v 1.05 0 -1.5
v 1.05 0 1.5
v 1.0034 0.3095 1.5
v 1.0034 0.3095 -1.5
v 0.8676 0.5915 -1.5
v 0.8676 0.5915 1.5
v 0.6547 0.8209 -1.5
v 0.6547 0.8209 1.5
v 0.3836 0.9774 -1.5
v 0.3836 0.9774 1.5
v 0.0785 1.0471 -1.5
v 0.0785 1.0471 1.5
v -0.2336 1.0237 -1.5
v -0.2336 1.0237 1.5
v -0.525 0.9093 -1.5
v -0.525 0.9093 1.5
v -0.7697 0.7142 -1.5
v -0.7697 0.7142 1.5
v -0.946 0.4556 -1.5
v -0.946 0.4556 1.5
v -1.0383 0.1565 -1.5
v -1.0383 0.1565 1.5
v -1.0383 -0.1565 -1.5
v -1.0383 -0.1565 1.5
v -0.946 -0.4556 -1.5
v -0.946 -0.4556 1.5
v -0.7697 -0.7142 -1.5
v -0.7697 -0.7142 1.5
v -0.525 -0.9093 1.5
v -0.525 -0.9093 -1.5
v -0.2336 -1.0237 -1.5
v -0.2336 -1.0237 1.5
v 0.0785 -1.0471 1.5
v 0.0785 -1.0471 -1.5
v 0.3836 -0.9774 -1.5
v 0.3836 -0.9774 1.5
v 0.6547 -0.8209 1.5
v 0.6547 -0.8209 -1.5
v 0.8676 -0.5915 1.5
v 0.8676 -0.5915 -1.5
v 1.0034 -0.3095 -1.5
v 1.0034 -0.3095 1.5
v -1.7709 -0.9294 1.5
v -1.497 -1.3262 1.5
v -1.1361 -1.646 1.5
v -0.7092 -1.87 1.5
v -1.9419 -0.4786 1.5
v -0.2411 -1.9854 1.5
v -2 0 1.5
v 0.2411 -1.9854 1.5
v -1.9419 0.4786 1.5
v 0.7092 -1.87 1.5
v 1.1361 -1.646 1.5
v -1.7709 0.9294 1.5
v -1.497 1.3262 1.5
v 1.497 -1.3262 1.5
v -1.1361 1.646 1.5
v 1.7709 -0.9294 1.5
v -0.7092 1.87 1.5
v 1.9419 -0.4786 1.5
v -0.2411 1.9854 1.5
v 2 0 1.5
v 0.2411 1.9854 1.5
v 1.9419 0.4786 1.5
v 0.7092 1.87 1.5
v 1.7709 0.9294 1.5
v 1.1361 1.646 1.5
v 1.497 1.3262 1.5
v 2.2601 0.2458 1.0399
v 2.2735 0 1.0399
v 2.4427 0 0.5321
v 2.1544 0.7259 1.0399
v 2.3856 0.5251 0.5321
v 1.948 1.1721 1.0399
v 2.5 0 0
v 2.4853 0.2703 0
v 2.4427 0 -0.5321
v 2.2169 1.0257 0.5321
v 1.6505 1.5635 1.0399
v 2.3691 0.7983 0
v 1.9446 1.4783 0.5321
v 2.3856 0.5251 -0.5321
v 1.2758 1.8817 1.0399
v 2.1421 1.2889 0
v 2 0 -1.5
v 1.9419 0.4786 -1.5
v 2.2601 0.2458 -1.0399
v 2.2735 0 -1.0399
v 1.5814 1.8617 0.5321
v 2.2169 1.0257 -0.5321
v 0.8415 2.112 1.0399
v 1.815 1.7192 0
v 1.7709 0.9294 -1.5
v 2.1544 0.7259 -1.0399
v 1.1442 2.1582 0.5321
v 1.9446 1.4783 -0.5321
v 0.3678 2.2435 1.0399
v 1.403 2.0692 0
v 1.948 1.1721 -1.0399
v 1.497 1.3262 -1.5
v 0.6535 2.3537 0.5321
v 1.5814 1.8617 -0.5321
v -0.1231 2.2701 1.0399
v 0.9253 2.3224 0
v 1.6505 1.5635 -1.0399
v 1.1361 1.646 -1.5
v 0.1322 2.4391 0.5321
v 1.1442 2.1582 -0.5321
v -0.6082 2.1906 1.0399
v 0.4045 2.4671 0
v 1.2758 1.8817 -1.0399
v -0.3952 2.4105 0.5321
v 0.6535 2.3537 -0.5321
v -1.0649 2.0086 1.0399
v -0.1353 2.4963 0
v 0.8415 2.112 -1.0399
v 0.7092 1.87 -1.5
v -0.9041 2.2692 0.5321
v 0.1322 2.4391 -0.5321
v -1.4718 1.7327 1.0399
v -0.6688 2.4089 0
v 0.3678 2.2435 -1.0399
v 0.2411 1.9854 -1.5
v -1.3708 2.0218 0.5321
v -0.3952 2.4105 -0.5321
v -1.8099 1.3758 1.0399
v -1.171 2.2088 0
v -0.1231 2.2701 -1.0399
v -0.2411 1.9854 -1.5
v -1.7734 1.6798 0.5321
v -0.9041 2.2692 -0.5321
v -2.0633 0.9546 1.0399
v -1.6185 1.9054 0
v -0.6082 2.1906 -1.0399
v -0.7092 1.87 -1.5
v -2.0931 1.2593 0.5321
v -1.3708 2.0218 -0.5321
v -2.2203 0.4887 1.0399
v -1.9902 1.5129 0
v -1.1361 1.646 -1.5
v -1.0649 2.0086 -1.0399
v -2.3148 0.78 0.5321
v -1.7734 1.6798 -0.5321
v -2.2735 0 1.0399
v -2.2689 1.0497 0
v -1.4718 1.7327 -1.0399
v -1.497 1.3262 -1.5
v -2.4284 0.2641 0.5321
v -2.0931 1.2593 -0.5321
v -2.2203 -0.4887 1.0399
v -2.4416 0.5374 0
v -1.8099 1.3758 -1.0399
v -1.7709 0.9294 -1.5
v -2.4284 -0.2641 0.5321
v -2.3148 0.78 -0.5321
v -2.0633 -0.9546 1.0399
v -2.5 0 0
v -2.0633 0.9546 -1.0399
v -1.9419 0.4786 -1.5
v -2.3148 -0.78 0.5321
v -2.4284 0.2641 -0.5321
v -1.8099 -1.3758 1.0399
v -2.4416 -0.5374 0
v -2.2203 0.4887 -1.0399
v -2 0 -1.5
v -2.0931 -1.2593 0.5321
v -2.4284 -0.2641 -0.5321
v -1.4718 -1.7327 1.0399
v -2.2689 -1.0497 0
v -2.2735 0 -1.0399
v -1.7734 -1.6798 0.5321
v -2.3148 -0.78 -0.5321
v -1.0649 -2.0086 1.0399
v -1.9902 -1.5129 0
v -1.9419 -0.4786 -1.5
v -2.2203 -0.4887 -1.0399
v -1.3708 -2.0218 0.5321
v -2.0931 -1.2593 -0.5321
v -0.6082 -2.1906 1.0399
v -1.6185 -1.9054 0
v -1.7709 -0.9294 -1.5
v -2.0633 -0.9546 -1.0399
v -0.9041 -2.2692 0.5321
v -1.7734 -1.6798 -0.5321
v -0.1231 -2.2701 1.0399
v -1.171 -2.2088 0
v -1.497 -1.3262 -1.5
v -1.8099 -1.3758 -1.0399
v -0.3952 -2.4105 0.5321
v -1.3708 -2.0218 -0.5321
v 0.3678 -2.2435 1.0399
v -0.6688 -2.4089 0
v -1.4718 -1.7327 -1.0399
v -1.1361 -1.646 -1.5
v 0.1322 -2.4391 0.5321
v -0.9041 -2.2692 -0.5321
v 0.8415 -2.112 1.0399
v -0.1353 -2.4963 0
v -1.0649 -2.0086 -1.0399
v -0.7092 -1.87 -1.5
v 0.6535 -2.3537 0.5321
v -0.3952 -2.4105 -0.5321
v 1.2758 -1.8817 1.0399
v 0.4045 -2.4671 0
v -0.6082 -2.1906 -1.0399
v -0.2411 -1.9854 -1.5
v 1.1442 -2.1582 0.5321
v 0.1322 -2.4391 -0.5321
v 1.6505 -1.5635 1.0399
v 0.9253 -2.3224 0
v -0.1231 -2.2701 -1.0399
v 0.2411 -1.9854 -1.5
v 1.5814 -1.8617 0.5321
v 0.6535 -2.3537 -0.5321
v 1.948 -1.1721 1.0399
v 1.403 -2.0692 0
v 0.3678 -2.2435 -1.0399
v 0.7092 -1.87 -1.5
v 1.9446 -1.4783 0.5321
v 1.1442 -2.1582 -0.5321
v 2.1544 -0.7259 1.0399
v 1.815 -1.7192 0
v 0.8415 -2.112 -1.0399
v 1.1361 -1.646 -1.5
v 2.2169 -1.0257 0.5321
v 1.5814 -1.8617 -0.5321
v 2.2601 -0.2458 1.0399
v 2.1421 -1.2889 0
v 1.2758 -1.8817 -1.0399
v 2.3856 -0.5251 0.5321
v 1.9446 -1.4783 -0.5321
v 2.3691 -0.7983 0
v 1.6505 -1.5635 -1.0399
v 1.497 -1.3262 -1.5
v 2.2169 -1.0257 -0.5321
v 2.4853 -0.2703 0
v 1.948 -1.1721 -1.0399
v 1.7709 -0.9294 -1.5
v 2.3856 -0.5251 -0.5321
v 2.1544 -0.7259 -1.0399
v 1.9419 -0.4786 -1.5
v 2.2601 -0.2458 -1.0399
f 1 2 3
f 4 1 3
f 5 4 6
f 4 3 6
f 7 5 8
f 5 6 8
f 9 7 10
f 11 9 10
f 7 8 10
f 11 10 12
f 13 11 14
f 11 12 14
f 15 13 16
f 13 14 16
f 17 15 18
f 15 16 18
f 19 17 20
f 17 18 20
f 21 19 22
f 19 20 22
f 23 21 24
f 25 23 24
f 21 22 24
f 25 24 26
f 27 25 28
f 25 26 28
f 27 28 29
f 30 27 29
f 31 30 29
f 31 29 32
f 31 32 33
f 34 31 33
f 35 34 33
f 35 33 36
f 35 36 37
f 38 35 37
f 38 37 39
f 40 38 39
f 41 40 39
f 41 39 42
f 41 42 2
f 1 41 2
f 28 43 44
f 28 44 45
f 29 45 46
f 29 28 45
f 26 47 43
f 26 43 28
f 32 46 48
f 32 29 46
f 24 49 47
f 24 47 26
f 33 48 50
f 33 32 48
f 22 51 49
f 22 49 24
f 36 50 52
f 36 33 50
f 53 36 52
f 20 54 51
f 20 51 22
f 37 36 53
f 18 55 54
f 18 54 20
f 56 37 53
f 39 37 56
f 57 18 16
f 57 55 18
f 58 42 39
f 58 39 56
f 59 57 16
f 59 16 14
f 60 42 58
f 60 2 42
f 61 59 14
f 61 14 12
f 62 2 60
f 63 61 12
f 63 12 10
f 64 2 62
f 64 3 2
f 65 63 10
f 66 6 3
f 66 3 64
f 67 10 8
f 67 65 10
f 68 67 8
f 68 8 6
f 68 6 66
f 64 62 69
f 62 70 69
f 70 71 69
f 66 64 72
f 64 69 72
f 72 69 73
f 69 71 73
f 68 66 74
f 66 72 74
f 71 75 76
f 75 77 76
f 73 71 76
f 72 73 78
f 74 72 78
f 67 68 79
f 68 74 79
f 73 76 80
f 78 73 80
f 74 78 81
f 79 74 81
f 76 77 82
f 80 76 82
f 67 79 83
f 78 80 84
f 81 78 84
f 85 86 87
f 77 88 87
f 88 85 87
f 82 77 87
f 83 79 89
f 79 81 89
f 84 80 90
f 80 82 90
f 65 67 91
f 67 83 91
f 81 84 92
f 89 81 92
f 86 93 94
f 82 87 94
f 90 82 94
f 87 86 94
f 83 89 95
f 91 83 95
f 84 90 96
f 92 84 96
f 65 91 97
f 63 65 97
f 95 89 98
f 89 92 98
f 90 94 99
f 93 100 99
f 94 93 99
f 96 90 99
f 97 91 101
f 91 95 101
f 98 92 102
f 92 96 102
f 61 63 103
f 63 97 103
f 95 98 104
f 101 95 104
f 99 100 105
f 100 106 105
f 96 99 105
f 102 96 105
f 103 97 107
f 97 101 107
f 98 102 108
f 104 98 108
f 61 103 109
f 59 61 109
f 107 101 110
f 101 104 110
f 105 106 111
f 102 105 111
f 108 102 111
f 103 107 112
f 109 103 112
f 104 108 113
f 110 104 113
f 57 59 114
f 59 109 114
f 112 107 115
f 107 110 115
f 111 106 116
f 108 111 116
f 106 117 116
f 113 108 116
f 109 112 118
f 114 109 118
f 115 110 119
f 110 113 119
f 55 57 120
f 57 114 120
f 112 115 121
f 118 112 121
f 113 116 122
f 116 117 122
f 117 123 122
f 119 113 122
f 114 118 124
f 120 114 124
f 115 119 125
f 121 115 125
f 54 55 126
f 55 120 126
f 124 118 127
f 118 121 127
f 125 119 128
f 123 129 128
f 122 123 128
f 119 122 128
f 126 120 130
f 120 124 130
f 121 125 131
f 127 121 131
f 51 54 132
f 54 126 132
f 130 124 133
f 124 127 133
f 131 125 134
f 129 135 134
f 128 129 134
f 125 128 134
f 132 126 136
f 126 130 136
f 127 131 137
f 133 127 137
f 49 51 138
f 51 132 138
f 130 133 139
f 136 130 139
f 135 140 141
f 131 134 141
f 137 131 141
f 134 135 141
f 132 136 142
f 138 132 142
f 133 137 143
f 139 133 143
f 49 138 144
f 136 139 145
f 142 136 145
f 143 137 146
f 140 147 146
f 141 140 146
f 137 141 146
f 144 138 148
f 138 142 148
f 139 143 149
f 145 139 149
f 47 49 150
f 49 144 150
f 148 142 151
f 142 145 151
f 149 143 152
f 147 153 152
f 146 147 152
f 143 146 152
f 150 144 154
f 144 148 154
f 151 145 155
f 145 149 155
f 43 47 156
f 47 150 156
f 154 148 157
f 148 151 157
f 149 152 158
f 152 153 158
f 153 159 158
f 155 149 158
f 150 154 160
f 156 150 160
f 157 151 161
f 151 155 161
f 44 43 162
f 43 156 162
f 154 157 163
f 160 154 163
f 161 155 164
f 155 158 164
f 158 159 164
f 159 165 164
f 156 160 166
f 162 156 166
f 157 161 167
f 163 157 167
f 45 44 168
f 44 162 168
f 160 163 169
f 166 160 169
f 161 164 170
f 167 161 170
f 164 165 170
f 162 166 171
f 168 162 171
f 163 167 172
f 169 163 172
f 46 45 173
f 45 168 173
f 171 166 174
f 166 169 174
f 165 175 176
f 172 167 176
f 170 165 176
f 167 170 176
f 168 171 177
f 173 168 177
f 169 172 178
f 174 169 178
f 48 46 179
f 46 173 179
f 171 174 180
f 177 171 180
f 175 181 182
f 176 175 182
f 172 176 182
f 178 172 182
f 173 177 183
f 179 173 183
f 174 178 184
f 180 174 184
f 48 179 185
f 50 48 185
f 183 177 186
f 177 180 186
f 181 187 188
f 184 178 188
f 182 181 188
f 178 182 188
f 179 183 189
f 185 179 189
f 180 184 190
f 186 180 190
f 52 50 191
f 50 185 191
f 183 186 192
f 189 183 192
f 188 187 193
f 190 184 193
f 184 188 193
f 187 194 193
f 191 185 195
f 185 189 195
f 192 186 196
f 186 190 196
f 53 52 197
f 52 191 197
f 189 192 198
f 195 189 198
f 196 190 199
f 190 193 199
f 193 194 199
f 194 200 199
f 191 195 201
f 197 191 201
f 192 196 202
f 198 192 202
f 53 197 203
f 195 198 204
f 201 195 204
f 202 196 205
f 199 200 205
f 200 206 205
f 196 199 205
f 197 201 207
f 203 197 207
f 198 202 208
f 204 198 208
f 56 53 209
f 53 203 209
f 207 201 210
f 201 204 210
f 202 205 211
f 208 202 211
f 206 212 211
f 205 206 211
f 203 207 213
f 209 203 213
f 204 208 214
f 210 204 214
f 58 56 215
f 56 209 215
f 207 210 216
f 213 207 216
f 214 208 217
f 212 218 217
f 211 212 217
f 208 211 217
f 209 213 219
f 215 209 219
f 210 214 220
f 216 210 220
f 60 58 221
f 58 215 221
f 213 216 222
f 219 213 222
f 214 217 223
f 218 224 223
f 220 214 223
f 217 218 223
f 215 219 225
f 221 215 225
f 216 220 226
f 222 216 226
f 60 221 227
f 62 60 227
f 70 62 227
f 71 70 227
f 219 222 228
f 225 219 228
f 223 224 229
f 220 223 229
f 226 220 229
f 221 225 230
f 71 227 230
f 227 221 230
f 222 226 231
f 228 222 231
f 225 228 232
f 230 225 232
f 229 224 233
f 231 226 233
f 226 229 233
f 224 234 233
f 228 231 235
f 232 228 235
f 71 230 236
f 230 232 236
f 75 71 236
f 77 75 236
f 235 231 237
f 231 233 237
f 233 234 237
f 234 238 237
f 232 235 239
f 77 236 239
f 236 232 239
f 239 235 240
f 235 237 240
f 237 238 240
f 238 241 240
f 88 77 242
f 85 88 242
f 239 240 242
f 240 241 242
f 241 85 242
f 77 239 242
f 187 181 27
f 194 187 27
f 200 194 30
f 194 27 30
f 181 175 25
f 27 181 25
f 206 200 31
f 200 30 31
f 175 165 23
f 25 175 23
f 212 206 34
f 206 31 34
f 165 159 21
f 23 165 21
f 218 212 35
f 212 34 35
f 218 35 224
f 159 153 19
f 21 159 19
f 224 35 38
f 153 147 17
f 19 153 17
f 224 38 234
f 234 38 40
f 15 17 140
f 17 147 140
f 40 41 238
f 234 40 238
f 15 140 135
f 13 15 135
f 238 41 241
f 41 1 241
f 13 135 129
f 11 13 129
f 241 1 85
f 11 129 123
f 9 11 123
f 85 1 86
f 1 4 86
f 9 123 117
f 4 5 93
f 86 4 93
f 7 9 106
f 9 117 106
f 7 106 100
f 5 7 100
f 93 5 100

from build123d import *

# Parameters (mm, degrees)
FLAT_HEIGHT_ENVELOPE_START = -1.5
SKETCH1_R                  = 2.51
FLAT_HEIGHT_ENVELOPE_DEPTH = 3
SKETCH2_R                  = 1.05
D2P1_MOUNTING_BORE_DEPTH   = 3.01


# Read off the part's stored shape, not the designer's step: Truncated_True_Sphere
with BuildPart() as part:
    # Sketch1 → Flat_Height_Envelope (new body)
    with BuildSketch(Plane.XY.offset(FLAT_HEIGHT_ENVELOPE_START)):
        Circle(SKETCH1_R)
    extrude(amount=FLAT_HEIGHT_ENVELOPE_DEPTH)

    # Truncated_True_Sphere outline → Truncated_True_Sphere (revolve, cut)
    with BuildSketch(Plane.XZ):
        with BuildLine():
            ThreePointArc((1.999999998, 1.500000002), (2.5, 0), (1.999999998, -1.500000002))
            Line((1.999999998, -1.500000002), (2.51, -1.500000002))
            Line((2.51, -1.500000002), (2.51, 1.5))
            Line((2.51, 1.5), (1.999999998, 1.500000002))
        make_face()
    revolve(axis=Axis((0, 0, 0), (0, 0, 1)), mode=Mode.SUBTRACT)

    # Sketch2 → D2p1_Mounting_Bore (cut)
    with BuildSketch(Plane.XY.offset(1.5)):
        Circle(SKETCH2_R)
    extrude(amount=-D2P1_MOUNTING_BORE_DEPTH, mode=Mode.SUBTRACT)


solid = part.part
